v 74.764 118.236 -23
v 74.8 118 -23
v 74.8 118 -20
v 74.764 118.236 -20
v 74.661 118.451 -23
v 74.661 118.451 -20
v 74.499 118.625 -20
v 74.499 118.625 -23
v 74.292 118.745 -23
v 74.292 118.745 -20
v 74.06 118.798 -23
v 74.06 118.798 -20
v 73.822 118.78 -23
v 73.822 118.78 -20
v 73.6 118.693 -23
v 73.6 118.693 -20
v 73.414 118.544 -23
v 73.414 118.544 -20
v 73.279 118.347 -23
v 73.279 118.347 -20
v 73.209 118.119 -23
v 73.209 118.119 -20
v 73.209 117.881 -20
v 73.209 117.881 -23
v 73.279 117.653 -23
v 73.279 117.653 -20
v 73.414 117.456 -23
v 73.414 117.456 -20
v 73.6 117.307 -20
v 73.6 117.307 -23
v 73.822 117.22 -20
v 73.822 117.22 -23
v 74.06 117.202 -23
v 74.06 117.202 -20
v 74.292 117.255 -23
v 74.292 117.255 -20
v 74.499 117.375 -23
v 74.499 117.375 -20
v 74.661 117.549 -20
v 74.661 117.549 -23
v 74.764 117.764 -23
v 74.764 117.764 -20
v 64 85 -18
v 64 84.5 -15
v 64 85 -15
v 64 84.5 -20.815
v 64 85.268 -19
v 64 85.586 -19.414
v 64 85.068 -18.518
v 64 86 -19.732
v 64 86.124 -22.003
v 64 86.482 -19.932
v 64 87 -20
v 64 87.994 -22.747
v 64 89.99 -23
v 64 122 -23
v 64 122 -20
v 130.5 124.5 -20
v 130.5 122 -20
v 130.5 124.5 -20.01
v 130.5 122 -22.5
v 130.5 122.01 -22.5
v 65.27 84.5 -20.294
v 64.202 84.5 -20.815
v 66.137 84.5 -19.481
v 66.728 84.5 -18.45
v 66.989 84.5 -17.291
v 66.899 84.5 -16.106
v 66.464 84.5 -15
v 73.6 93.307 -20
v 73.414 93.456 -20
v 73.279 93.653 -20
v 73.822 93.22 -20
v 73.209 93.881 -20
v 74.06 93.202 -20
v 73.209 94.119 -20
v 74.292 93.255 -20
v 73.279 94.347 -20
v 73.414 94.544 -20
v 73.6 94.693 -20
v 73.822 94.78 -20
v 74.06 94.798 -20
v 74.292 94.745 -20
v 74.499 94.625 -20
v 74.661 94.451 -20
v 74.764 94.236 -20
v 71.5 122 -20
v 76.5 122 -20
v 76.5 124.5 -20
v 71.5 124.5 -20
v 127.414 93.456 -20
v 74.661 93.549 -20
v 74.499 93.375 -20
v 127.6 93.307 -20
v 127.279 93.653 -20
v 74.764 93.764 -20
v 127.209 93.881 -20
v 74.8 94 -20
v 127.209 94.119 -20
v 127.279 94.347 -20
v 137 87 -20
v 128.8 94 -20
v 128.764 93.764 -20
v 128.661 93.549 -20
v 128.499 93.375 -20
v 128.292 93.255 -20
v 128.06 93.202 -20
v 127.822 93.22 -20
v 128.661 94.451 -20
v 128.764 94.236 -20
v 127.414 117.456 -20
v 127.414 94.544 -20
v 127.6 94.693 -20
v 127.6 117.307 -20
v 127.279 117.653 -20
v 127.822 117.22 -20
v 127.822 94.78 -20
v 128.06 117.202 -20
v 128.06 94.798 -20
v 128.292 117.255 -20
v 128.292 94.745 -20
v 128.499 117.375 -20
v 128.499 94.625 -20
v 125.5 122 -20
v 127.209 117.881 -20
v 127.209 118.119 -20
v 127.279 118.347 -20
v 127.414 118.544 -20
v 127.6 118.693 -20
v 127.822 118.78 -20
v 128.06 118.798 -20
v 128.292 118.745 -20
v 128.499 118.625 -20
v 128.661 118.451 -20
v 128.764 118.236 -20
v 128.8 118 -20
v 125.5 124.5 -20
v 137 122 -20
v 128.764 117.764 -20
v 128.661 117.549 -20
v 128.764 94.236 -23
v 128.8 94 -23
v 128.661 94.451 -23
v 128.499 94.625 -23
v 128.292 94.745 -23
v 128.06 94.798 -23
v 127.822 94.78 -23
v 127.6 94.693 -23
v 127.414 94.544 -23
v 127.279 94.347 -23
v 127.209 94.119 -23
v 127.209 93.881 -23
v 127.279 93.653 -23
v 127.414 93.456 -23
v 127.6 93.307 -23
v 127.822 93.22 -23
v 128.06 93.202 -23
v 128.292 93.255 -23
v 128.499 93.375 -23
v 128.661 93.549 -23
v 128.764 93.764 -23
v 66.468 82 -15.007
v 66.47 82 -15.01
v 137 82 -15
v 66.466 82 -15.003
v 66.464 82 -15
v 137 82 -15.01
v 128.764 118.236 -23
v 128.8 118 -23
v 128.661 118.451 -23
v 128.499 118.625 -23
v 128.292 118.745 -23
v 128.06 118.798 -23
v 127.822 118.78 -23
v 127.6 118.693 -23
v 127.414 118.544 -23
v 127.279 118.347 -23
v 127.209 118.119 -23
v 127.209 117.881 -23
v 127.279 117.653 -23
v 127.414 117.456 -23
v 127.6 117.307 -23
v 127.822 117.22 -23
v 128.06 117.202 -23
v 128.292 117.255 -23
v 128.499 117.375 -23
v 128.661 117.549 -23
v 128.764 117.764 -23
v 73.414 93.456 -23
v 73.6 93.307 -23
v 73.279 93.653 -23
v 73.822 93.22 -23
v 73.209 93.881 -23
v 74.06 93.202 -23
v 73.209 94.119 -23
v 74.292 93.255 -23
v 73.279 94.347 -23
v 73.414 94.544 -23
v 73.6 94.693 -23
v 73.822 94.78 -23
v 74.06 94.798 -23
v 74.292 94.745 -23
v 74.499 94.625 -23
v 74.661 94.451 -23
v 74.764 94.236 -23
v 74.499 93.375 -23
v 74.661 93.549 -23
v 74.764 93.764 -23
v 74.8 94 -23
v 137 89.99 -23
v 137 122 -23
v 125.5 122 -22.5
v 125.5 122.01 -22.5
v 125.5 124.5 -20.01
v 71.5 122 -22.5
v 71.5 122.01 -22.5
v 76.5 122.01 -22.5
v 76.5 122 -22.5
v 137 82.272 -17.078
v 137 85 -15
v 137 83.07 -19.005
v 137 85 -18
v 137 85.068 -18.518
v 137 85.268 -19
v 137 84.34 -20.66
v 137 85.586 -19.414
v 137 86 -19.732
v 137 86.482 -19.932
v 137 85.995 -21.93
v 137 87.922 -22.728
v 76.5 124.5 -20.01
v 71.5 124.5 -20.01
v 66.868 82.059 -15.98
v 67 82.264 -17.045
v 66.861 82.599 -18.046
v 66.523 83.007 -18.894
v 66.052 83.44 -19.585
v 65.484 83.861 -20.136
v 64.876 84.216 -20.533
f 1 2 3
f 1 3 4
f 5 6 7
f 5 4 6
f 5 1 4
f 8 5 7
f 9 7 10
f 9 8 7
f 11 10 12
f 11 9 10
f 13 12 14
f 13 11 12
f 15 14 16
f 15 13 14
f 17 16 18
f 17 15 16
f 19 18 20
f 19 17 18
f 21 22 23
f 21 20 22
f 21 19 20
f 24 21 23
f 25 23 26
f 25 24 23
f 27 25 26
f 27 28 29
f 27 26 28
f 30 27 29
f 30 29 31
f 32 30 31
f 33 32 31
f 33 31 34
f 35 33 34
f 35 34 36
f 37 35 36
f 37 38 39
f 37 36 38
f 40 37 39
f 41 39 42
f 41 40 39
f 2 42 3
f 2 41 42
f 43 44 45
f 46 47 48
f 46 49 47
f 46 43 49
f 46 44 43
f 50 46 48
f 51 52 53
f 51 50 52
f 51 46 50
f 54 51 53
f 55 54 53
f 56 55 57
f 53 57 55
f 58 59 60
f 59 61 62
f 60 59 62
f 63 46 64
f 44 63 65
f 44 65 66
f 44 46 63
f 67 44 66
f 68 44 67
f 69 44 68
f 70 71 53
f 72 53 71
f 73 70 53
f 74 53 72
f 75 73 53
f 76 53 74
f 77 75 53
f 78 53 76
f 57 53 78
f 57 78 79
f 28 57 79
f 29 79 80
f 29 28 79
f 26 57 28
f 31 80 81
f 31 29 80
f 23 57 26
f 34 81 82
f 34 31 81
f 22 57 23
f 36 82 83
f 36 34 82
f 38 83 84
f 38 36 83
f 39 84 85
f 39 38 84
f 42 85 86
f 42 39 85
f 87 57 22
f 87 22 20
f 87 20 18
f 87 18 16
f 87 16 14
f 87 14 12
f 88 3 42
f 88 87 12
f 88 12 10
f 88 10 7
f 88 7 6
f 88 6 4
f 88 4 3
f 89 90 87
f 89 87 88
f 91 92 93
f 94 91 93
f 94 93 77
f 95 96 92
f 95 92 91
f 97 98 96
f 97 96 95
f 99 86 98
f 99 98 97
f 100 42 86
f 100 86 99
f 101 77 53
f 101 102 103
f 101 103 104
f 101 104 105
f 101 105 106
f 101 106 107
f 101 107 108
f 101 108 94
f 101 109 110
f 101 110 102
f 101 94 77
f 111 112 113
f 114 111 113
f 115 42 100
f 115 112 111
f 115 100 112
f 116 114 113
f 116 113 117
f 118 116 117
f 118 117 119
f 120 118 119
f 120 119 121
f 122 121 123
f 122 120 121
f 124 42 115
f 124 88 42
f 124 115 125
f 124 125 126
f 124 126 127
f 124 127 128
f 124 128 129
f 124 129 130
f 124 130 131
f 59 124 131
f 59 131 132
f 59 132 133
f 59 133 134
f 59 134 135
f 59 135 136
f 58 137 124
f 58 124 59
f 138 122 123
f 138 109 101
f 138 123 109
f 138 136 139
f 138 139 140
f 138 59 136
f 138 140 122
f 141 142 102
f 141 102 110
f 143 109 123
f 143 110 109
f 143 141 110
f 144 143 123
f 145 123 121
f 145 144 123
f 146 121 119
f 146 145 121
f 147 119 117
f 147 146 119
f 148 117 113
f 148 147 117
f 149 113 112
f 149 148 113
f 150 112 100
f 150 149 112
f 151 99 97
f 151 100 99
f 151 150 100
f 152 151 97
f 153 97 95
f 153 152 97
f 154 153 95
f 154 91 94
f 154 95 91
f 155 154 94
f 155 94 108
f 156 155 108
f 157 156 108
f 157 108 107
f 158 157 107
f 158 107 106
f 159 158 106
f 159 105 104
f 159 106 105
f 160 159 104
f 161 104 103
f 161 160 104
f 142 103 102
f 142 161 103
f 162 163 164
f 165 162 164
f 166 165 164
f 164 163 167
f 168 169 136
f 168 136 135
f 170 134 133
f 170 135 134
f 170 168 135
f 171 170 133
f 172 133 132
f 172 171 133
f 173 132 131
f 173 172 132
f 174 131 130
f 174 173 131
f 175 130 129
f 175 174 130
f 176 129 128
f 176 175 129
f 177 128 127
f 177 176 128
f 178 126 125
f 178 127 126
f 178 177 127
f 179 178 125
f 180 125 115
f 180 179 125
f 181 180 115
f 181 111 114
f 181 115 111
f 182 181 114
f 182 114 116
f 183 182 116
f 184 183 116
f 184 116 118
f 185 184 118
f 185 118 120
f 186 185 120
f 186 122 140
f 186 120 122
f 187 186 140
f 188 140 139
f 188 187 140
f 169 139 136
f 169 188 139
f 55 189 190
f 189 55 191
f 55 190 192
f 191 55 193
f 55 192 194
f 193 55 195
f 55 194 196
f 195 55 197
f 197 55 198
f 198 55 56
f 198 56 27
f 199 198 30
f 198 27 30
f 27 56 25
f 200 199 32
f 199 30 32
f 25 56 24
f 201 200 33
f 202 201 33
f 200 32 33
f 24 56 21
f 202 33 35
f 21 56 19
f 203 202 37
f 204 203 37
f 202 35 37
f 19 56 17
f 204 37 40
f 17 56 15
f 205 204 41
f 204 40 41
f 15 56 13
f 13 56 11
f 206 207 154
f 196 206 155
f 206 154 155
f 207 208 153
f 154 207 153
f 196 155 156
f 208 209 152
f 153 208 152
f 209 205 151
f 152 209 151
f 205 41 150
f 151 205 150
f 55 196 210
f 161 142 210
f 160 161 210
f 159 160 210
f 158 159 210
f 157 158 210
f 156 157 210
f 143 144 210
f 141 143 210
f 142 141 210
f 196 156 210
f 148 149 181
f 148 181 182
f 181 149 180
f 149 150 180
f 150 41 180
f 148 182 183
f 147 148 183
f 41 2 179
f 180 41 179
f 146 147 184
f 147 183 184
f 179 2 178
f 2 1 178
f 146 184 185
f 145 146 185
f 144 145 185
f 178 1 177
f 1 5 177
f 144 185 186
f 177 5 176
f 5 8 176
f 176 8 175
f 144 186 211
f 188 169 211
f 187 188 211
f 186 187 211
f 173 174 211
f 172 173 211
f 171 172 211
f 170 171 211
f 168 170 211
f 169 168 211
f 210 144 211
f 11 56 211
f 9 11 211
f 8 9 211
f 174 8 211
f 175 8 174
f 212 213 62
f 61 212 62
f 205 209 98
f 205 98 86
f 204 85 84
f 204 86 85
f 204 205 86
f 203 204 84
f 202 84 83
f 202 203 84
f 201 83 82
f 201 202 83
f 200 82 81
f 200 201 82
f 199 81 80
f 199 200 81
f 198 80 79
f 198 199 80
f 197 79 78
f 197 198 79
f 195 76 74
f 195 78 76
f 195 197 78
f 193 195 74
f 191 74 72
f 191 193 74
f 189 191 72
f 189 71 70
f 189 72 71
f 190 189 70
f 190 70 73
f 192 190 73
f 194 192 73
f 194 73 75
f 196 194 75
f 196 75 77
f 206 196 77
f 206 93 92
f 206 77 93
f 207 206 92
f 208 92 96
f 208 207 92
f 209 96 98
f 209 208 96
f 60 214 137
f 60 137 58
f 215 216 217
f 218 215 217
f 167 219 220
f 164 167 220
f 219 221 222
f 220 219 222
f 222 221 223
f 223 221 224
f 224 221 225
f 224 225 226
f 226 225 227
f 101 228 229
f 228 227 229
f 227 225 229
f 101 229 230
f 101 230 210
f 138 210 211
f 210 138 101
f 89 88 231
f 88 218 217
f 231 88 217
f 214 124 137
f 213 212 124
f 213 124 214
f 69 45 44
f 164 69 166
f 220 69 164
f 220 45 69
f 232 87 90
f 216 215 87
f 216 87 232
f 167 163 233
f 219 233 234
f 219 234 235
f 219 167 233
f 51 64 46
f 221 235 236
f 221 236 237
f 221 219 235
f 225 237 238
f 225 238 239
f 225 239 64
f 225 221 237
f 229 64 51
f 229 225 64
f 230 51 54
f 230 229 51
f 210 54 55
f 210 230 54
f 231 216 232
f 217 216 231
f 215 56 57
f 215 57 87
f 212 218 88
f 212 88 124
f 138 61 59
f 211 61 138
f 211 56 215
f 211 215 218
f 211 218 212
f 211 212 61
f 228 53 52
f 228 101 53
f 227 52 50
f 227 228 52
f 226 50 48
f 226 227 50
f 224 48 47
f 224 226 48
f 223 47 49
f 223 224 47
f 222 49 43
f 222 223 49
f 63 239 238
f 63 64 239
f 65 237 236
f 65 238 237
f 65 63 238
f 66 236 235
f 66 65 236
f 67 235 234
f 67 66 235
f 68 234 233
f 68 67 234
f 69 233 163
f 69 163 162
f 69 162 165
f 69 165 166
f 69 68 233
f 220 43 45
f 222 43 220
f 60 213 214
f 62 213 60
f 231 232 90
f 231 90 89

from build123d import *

# Parameters (mm, degrees)
CYLINDER028_R          = 4
CYLINDER028_DEPTH      = 2.5
CYLINDER028_ROLL_ANGLE = 90
BOX023_W               = 5
BOX023_H               = 2.5
BOX023_DEPTH           = 2.5
CHAMFER003_SIZE        = 2.49
BOX021_W               = 5
BOX021_H               = 2.5
BOX021_DEPTH           = 2.5
CHAMFER001_SIZE        = 2.49
CYLINDER014_R          = 0.8
CYLINDER014_DEPTH      = 28
CYLINDER015_R          = 0.8
CYLINDER015_DEPTH      = 28
CYLINDER009_R          = 0.8
CYLINDER009_DEPTH      = 28
CYLINDER008_R          = 0.8
CYLINDER008_DEPTH      = 28
BOX012_W               = 73
BOX012_H               = 37
BOX012_DEPTH           = 3
BOX011_W               = 73
BOX011_H               = 3
BOX011_DEPTH           = 8
FILLET004_R            = 7.99
FILLET005_R            = 2


with BuildPart() as cylinder028:
    # Cylinder028 → Cylinder028 (new body)
    with BuildSketch(Plane.XY):
        Circle(CYLINDER028_R)
    extrude(amount=CYLINDER028_DEPTH)


with BuildPart() as cylinder028_1:
    # Cylinder028 roll: moved
    add(cylinder028.part.rotate(Axis((0, 0, 0), (1, 0, 0)), CYLINDER028_ROLL_ANGLE))


with BuildPart() as cylinder028_2:
    # Cylinder028 placement: moved
    add(cylinder028_1.part.moved(Location((63, 84.5, -17))))


with BuildPart() as chamfer003:
    # Box023 → Box023 (new body)
    with BuildSketch(Plane(origin=(70.5, 113, -22.5), x_dir=(1, 0, 0), z_dir=(0, 0, 1))):
        with Locations((2.5, 1.25)):
            Rectangle(BOX023_W, BOX023_H)
    extrude(amount=BOX023_DEPTH)

    # Chamfer003
    chamfer003_edges = [chamfer003.edges().sort_by_distance(p)[0] for p in [
        (73, 115.5, -22.5),
    ]]
    chamfer(chamfer003_edges, length=CHAMFER003_SIZE)


with BuildPart() as chamfer003_1:
    # Chamfer003 placement: moved
    add(chamfer003.part.moved(Location((55, 9, 0))))


with BuildPart() as fusion016:
    # Box021 → Box021 (new body)
    with BuildSketch(Plane(origin=(70.5, 113, -22.5), x_dir=(1, 0, 0), z_dir=(0, 0, 1))):
        with Locations((2.5, 1.25)):
            Rectangle(BOX021_W, BOX021_H)
    extrude(amount=BOX021_DEPTH)

    # Chamfer001
    chamfer001_edges = [fusion016.edges().sort_by_distance(p)[0] for p in [
        (73, 115.5, -22.5),
    ]]
    chamfer(chamfer001_edges, length=CHAMFER001_SIZE)


with BuildPart() as fusion016_1:
    # Chamfer001 placement: moved
    add(fusion016.part.moved(Location((1, 9, 0))))

    # Fusion016: union Chamfer003
    add(chamfer003_1.part)


with BuildPart() as cylinder014:
    # Cylinder014 → Cylinder014 (new body)
    with BuildSketch(Plane(origin=(74, 118, -26), x_dir=(1, 0, 0), z_dir=(0, 0, 1))):
        Circle(CYLINDER014_R)
    extrude(amount=CYLINDER014_DEPTH)


with BuildPart() as fusion011:
    # Cylinder015 → Cylinder015 (new body)
    with BuildSketch(Plane(origin=(74, 94, -26), x_dir=(1, 0, 0), z_dir=(0, 0, 1))):
        Circle(CYLINDER015_R)
    extrude(amount=CYLINDER015_DEPTH)

    # Fusion011: union Cylinder014
    add(cylinder014.part)


with BuildPart() as fusion011_1:
    # Fusion011 placement: moved
    add(fusion011.part.moved(Location((54, 0, 0))))


with BuildPart() as cylinder009:
    # Cylinder009 → Cylinder009 (new body)
    with BuildSketch(Plane(origin=(74, 118, -26), x_dir=(1, 0, 0), z_dir=(0, 0, 1))):
        Circle(CYLINDER009_R)
    extrude(amount=CYLINDER009_DEPTH)


with BuildPart() as fusion012:
    # Cylinder008 → Cylinder008 (new body)
    with BuildSketch(Plane(origin=(74, 94, -26), x_dir=(1, 0, 0), z_dir=(0, 0, 1))):
        Circle(CYLINDER008_R)
    extrude(amount=CYLINDER008_DEPTH)

    # Fusion010: union Cylinder009
    add(cylinder009.part)

    # Fusion012: union Fusion011
    add(fusion011_1.part)


with BuildPart() as box012:
    # Box012 → Box012 (new body)
    with BuildSketch(Plane(origin=(64, 85, -23), x_dir=(1, 0, 0), z_dir=(0, 0, 1))):
        with Locations((36.5, 18.5)):
            Rectangle(BOX012_W, BOX012_H)
    extrude(amount=BOX012_DEPTH)


with BuildPart() as cut026:
    # Box011 → Box011 (new body)
    with BuildSketch(Plane(origin=(64, 82, -23), x_dir=(1, 0, 0), z_dir=(0, 0, 1))):
        with Locations((36.5, 1.5)):
            Rectangle(BOX011_W, BOX011_H)
    extrude(amount=BOX011_DEPTH)

    # Fusion001: union Box012
    add(box012.part)

    # Fillet004
    fillet004_edges = [cut026.edges().sort_by_distance(p)[0] for p in [
        (100.5, 82, -23),
    ]]
    fillet(fillet004_edges, radius=FILLET004_R)

    # Fillet005
    fillet005_edges = [cut026.edges().sort_by_distance(p)[0] for p in [
        (100.5, 85, -20),
    ]]
    fillet(fillet005_edges, radius=FILLET005_R)

    # Cut013: cut Fusion012
    add(fusion012.part, mode=Mode.SUBTRACT)

    # Fusion017: union Fusion016
    add(fusion016_1.part)

    # Cut026: cut Cylinder028
    add(cylinder028_2.part, mode=Mode.SUBTRACT)


solid = cut026.part
